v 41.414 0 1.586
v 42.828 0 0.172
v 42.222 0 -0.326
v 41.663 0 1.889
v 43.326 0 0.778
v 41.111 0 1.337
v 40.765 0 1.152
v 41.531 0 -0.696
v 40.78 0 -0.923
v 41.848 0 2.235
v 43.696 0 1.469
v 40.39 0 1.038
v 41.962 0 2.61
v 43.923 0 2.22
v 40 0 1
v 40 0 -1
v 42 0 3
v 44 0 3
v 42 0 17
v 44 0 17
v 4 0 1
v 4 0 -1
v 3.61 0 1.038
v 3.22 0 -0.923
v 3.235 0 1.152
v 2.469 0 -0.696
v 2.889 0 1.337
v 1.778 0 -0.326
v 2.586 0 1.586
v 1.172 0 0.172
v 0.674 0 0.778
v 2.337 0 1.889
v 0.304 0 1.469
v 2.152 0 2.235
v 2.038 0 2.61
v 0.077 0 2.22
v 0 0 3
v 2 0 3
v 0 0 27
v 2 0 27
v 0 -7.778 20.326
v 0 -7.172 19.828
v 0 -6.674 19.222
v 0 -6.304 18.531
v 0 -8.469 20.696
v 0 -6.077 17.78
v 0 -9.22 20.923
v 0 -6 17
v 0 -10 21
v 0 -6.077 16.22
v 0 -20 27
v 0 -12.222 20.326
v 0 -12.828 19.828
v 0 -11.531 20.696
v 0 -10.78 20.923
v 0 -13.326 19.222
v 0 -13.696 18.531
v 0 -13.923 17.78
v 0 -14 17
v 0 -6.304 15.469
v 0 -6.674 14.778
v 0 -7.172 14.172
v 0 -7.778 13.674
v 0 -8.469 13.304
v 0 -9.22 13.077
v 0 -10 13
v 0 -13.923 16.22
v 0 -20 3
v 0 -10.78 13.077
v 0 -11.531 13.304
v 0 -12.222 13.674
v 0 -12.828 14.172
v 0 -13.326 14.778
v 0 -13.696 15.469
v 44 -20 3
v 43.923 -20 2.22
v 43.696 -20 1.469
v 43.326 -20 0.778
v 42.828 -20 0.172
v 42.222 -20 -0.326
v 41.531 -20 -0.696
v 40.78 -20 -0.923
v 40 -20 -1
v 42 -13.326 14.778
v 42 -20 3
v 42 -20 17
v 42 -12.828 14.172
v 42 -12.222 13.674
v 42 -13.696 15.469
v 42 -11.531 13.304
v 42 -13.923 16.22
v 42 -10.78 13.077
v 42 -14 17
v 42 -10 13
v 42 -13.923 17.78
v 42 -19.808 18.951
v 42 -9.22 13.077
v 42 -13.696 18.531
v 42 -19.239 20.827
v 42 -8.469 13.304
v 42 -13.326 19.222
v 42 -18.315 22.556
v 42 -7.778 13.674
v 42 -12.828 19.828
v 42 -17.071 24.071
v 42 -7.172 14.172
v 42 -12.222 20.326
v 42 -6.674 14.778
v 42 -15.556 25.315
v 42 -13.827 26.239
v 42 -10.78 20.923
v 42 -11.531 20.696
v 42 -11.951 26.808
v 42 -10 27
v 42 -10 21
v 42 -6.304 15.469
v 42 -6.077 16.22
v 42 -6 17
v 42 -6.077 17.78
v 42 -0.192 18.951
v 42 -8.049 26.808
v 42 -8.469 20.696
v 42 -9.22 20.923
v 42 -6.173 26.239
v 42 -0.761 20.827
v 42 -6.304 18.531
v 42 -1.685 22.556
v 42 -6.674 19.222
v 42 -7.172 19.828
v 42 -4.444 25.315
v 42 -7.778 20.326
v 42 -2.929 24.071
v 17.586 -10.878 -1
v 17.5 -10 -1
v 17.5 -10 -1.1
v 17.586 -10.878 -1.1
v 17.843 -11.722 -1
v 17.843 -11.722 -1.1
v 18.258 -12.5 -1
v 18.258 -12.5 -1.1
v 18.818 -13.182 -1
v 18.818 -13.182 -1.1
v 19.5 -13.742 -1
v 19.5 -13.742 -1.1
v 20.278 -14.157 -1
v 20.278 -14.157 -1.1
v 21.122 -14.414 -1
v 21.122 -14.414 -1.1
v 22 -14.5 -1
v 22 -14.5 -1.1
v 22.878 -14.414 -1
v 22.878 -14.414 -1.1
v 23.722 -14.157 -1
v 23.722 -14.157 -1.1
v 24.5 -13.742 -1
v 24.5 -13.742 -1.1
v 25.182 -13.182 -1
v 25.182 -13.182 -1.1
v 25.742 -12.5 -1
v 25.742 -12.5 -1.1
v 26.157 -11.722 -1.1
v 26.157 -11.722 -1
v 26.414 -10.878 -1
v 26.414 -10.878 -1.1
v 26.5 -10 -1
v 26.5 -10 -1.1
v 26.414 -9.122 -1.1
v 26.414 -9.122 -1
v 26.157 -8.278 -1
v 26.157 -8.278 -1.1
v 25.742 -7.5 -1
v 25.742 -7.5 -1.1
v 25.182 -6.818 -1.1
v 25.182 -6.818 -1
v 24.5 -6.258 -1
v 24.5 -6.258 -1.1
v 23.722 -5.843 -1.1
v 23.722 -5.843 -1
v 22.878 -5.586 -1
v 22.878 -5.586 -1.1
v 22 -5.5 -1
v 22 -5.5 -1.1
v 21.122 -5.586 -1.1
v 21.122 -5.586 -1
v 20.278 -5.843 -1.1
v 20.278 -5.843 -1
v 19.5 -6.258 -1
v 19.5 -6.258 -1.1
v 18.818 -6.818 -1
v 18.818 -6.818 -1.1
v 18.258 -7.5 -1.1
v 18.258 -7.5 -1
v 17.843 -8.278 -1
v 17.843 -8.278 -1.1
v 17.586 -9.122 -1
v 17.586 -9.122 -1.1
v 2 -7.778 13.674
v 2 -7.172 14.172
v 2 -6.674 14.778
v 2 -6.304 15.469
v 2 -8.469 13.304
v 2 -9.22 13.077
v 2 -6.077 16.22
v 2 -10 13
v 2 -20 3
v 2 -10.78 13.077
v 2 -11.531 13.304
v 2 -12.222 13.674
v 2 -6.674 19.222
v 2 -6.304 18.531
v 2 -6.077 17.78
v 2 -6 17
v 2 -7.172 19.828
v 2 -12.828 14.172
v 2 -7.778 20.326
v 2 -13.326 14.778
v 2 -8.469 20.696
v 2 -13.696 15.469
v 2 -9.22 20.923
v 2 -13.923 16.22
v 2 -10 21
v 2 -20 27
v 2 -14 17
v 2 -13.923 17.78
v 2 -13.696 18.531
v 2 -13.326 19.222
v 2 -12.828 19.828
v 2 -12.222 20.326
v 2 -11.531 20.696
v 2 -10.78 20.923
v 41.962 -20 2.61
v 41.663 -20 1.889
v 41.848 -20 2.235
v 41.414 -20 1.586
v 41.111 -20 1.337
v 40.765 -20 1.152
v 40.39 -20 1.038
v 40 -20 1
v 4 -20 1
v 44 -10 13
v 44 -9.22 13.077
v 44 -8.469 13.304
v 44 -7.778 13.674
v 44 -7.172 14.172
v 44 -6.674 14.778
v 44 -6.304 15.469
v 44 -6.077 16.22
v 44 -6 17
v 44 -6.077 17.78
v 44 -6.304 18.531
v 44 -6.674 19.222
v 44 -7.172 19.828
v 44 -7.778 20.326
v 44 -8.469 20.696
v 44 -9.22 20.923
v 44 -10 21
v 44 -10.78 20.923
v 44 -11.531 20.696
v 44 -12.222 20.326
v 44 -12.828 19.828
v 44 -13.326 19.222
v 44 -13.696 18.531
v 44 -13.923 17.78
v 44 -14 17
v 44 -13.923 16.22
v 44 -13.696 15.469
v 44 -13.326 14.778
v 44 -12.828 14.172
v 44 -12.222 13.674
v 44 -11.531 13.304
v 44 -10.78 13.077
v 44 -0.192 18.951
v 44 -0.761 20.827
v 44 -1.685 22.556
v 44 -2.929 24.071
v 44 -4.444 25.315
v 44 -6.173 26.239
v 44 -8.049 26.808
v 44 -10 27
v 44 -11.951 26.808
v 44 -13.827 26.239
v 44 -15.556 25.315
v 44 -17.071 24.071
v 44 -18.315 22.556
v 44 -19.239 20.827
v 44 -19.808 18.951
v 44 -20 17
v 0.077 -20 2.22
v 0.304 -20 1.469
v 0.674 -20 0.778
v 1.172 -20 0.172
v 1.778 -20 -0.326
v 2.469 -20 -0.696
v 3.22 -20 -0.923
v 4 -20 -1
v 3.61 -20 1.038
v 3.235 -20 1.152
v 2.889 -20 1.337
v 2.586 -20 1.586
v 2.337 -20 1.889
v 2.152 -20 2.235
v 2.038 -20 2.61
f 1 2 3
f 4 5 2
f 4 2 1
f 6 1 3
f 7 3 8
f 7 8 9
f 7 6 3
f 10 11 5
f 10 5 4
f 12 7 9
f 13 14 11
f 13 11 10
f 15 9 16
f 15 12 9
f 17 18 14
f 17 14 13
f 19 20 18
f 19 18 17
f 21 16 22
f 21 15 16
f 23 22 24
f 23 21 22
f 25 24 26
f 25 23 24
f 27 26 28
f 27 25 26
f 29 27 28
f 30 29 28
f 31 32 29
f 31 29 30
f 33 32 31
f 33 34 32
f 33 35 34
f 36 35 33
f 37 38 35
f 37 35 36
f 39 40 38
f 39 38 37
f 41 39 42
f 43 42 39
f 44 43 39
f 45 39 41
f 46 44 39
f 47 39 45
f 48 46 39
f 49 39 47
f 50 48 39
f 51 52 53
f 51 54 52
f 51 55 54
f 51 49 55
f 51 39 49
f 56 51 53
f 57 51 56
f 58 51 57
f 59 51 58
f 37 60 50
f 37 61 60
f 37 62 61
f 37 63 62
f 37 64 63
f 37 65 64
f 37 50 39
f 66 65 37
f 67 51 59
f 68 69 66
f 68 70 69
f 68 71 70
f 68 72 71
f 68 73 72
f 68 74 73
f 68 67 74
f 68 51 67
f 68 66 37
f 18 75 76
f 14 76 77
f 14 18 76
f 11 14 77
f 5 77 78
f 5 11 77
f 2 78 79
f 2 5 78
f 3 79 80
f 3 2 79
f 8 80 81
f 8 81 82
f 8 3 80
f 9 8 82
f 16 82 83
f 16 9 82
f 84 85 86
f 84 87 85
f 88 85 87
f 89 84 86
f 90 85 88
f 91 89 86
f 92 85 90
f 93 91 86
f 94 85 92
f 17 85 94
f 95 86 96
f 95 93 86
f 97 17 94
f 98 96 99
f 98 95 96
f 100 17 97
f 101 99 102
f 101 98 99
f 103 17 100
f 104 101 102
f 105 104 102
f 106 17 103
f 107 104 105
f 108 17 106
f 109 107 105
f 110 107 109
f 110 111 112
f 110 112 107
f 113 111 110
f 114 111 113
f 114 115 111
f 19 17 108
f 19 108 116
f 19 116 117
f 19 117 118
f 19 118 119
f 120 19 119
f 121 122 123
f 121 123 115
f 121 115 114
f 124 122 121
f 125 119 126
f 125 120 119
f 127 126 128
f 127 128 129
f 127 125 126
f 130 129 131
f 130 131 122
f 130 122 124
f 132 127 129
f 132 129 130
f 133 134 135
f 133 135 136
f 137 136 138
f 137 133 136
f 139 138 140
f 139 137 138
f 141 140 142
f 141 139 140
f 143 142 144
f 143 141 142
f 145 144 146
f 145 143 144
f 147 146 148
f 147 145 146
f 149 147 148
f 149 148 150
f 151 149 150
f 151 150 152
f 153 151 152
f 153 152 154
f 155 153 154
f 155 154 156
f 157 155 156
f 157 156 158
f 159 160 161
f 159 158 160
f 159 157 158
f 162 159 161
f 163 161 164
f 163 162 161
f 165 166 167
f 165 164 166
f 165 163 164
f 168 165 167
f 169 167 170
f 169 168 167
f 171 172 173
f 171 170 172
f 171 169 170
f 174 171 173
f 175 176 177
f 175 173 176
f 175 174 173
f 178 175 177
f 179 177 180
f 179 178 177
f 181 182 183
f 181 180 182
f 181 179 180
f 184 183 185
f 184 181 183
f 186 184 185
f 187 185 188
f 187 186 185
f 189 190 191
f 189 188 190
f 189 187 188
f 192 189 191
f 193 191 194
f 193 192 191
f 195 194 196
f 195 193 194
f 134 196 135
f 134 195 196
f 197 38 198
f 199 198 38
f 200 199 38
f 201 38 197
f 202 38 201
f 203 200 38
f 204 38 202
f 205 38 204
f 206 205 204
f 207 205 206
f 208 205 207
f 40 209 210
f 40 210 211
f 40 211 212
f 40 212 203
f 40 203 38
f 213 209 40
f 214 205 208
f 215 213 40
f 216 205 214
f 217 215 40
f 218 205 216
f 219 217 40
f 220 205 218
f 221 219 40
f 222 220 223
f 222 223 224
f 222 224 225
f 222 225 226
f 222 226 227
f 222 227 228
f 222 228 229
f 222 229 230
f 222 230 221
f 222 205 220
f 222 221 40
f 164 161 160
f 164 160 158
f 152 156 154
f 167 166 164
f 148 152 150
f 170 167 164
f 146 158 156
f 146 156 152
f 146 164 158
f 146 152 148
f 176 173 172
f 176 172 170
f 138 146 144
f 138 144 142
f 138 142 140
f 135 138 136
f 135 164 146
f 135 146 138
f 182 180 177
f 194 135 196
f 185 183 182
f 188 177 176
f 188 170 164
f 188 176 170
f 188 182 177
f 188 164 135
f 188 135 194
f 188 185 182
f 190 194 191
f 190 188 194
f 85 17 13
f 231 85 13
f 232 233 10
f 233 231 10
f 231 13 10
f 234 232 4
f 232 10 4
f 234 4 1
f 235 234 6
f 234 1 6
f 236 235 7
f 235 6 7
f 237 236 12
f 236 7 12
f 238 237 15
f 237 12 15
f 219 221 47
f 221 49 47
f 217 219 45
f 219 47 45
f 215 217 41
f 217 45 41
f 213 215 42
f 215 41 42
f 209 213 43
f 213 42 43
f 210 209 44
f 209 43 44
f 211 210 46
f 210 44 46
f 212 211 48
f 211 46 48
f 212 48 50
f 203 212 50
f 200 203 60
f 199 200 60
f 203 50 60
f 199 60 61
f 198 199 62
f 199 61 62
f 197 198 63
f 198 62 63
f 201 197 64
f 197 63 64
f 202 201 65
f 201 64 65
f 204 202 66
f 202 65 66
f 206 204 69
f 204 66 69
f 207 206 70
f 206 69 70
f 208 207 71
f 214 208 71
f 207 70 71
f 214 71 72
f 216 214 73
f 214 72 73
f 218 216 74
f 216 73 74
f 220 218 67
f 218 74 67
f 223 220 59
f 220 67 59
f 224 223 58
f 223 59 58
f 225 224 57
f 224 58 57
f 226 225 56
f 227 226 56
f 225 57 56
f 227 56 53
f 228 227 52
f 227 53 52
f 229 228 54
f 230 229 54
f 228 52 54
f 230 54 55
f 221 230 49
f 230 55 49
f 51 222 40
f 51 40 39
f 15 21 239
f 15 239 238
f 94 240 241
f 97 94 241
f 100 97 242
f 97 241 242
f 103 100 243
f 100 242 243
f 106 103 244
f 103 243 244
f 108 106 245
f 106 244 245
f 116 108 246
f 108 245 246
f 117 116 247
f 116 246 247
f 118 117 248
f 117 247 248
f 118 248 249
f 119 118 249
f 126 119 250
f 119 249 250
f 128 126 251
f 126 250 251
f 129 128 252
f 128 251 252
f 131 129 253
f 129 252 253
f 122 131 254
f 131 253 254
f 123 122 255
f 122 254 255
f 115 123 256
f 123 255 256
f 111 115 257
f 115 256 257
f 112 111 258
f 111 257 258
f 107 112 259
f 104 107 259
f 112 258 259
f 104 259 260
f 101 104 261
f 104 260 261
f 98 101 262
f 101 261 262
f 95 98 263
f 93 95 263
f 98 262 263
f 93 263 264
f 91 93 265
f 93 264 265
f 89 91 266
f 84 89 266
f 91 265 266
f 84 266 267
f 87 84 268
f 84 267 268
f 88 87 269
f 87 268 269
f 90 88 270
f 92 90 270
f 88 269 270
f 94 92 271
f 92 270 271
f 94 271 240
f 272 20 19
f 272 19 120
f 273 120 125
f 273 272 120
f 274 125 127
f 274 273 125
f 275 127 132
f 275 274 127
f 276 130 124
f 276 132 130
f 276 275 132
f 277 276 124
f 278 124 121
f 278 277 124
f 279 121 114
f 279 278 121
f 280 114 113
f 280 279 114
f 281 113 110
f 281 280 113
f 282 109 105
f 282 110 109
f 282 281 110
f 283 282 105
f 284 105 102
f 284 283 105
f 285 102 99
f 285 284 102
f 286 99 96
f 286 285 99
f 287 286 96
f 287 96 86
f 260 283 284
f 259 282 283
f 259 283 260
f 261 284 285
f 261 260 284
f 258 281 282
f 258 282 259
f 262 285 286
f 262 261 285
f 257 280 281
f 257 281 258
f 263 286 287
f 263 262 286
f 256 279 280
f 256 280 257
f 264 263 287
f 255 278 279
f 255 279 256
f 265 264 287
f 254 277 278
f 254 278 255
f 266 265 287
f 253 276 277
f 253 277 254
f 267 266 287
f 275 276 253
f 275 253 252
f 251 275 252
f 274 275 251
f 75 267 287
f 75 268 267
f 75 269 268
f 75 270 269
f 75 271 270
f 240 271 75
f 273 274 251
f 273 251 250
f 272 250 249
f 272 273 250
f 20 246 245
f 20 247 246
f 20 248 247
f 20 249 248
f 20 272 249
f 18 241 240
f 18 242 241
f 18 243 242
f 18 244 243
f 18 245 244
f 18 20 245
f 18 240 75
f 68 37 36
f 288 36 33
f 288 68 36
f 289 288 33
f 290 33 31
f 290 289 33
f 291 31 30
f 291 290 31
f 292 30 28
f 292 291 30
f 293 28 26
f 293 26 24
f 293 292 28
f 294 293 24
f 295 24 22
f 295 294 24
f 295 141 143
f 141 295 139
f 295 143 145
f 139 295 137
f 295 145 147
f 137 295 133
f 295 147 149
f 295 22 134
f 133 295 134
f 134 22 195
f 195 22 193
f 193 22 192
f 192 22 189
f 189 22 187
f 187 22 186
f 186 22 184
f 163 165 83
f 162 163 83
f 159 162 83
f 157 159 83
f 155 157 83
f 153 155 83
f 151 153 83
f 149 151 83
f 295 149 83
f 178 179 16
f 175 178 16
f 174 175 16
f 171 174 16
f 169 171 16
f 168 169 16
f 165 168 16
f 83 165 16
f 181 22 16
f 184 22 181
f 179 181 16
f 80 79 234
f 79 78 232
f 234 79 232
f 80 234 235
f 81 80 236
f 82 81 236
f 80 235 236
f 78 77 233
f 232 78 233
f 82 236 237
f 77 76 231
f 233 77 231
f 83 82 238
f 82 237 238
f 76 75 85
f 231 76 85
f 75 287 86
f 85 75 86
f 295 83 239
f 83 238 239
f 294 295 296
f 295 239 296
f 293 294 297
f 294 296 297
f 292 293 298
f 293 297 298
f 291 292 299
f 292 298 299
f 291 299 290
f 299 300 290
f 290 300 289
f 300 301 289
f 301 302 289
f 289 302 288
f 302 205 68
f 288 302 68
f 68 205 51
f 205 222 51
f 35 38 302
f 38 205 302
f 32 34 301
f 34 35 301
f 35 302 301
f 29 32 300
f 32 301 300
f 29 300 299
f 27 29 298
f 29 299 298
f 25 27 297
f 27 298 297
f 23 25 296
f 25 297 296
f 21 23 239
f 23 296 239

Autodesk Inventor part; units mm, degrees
ref_plane "YZ Plane" through (0, 0, 0) normal (1, 0, 0) x (0, 1, 0)
ref_plane "XZ Plane" through (0, 0, 0) normal (0, 1, 0) x (-1, 0, 0)
ref_plane "XY Plane" through (0, 0, 0) normal (0, 0, 1) x (1, 0, 0)
sketch "Sketch1" plane through (0, 0, 0) normal (0, 0, 1) x (1, 0, 0)
  line L0 (0, 0) -> (44, 0)
  line L1 (44, 0) -> (44, -20)
  line L2 (44, -20) -> (0, -20)
  line L3 (0, -20) -> (0, 0)
  dimension "d0" = 44
  dimension "d1" = 20
extrude "Extrusion1" add sketch "Sketch1" along normal mid plane 2
sketch "Sketch2" plane through (42, 0, -1) normal (1, 0, 0) x (0, 1, 0)
  line L0 (-20, 0) -> (0, 0)
  line L1 (0, 0) -> (0, 28)
  line L2 (0, 28) -> (-20, 28)
  line L3 (-20, 28) -> (-20, 0)
edge flange "Flange1" height 28 angle 90 thickness 2 bend radius 2 thickness toward (1, 0, 0) relief tear relief width 2 relief depth 1 corner gap 2 corner form 0 edges at (44, -10, 1) (0, -10, 1) wall of the first edge with corners at (42, -20, -1) (42, 0, -1) (42, 0, 27) (42, -20, 27)
bend "Bend1"
corner "Corner1"
sketch "Sketch3" plane through (44, -20, 27) normal (1, 0, 0) x (0, 0, -1)
  line L0 (24, 0) -> (0, 0) projected
  line L1 (0, 0) -> (0, 20) projected
  line L2 (0, 0) -> (0, 20)
  line L3 (0, 20) -> (10, 20)
  line L4 (0, 20) -> (24, 20) projected
  line L5 (0, 0) -> (10, 0)
  arc A0 (10, 20) -> (10, 0) centre (10, 10) ccw
  circle A1 centre (10, 10) radius 4
  point P0 (27, 20)
  point P1 (0, 10)
  dimension "d15" = 10
  dimension "d16" = 8
extrude "Cut1" cut sketch "Sketch3" against normal blind 2
sketch "Sketch4" plane through (0, -20, 27) normal (-1, 0, 0) x (0, 0, 1)
  circle A0 centre (-10, 10) radius 4 projected
  circle A1 centre (-10, 10) radius 4
  point P0 (-27, 20)
extrude "Cut2" cut sketch "Sketch4" against normal blind 2
sketch "Sketch5" plane through (0, 0, -1) normal (0, 0, -1) x (-1, 0, 0)
  line L0 (-4, -20) -> (-4, 0) projected
  line L1 (-4, 0) -> (-40, 0) projected
  line L2 (-40, -20) -> (-4, -20) projected
  line L3 (-40, 0) -> (-40, -20) projected
  circle A0 centre (-22, -10) radius 4.5
  point P0 (0, 0)
  dimension "d21" = 9
  dimension "d22" = 18
  dimension "d23" = 10
extrude "Extrusion2" add sketch "Sketch5" along normal blind 0.1 contours A0
equation "\"d17\" = Thickness"
equation "\"d19\" = Thickness"
equation "\"d4\" = Thickness"
equation "\"d5\" = BendReliefWidth"
equation "\"d6\" = BendReliefDepth"
equation "\"d7\" = MinimumRemnant"
equation "\"d8\" = TransitionRadius"
equation "\"d11\" = BendRadius"
equation "\"d12\" = CornerReliefSize"
equation "\"d13\" = GapSize"
equation "\"d14\" = JacobiRadiusSize"
equation "\"BendRadius\" = Thickness"
equation "\"BendReliefWidth\" = Thickness"
equation "\"BendReliefDepth\" = 0.5 * Thickness"
equation "\"CornerReliefSize\" = 4 * Thickness"
equation "\"MinimumRemnant\" = 2 * Thickness"
equation "\"TransitionRadius\" = BendRadius"
equation "\"JacobiRadiusSize\" = BendRadius"
equation "\"GapSize\" = Thickness"
equation "\"Thickness\" = 2"
properties part number "SHEET_METAL2"
